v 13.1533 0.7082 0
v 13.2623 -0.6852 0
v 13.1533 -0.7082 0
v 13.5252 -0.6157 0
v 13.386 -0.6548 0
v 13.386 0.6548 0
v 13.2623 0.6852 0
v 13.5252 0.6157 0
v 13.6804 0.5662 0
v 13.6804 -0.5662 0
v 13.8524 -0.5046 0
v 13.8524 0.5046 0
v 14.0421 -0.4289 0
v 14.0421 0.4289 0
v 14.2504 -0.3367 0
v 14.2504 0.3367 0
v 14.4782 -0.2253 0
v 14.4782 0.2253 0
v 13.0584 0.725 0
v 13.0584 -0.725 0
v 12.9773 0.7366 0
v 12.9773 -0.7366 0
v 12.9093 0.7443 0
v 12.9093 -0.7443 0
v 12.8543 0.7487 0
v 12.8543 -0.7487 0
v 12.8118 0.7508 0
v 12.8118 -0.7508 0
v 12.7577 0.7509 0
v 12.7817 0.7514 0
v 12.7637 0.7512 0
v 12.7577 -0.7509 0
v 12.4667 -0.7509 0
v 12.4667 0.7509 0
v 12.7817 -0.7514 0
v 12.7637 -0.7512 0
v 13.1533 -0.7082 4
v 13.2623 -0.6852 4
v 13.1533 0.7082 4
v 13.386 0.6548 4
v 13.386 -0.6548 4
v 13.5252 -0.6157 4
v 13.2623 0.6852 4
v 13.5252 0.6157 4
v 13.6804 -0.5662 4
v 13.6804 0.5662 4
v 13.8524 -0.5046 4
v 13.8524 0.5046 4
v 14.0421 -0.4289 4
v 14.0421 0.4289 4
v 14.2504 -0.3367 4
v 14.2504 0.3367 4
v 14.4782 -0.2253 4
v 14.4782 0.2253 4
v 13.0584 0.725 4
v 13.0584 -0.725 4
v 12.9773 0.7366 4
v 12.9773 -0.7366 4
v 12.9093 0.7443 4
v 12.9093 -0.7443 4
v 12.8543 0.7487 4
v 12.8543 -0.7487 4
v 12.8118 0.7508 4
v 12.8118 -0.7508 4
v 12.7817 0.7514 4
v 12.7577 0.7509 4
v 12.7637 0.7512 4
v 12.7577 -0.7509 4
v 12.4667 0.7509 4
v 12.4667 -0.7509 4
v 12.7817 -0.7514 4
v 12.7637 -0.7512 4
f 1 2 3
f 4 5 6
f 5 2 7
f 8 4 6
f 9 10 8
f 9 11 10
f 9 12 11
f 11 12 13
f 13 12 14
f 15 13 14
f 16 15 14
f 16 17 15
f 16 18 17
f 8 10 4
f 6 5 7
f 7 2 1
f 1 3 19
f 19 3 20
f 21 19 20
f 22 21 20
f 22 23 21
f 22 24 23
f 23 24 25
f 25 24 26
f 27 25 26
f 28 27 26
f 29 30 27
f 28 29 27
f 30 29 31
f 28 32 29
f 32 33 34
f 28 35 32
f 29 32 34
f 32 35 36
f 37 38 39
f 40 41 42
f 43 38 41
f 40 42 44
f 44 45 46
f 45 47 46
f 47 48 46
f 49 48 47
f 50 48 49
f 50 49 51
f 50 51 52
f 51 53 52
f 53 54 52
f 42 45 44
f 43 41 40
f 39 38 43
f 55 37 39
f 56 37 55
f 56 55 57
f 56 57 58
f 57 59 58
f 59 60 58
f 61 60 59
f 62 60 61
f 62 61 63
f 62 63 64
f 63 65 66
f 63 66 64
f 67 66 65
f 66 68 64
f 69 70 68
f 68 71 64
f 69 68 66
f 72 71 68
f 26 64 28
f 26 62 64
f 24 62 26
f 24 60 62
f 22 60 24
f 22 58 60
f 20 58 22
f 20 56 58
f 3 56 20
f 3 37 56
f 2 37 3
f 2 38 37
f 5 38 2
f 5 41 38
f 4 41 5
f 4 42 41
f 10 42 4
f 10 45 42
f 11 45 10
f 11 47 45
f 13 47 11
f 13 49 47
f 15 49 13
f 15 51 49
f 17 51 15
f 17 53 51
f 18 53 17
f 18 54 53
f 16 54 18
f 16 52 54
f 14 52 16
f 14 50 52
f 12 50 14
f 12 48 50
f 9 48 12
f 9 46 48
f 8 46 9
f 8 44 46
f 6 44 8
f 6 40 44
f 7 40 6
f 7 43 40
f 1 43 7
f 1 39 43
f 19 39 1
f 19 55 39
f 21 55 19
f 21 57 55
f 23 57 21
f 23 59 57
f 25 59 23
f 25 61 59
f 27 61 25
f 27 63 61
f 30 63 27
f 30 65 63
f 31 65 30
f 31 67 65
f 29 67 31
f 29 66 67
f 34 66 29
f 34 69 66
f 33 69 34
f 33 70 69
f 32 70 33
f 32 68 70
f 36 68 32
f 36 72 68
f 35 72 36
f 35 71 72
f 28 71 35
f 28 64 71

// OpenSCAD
/***
 * @function tooth_construction
 * @brief Tooth construction preview: Render one validated cached local tooth candidate.
 * Source: [`tooth/construction.scad`](tooth/construction.scad)
 *
 * This is the standalone output of tooth/generation.scad. It is intentionally
 * local rather than attached to a curve, so the involute flanks and top
 * closure can be inspected without placement hiding their shape.
 * @image ../images/tooth/construction.png Tooth construction preview preview
 * @image ../images/table-spacer.png ⠀
 */
include <../../src/common/curve_gears_math.scad>;

$fn=96;
modul=.8;
tooth_number=34;
pressure_angle=20;
candidate=_cg_reference_tooth_candidate(modul*tooth_number/2,modul,tooth_number,pressure_angle);
assert(candidate[0],str("tooth construction failed: ",candidate[1]));

color("SteelBlue")
    linear_extrude(height=4,convexity=4)
        polygon(candidate[8]);
